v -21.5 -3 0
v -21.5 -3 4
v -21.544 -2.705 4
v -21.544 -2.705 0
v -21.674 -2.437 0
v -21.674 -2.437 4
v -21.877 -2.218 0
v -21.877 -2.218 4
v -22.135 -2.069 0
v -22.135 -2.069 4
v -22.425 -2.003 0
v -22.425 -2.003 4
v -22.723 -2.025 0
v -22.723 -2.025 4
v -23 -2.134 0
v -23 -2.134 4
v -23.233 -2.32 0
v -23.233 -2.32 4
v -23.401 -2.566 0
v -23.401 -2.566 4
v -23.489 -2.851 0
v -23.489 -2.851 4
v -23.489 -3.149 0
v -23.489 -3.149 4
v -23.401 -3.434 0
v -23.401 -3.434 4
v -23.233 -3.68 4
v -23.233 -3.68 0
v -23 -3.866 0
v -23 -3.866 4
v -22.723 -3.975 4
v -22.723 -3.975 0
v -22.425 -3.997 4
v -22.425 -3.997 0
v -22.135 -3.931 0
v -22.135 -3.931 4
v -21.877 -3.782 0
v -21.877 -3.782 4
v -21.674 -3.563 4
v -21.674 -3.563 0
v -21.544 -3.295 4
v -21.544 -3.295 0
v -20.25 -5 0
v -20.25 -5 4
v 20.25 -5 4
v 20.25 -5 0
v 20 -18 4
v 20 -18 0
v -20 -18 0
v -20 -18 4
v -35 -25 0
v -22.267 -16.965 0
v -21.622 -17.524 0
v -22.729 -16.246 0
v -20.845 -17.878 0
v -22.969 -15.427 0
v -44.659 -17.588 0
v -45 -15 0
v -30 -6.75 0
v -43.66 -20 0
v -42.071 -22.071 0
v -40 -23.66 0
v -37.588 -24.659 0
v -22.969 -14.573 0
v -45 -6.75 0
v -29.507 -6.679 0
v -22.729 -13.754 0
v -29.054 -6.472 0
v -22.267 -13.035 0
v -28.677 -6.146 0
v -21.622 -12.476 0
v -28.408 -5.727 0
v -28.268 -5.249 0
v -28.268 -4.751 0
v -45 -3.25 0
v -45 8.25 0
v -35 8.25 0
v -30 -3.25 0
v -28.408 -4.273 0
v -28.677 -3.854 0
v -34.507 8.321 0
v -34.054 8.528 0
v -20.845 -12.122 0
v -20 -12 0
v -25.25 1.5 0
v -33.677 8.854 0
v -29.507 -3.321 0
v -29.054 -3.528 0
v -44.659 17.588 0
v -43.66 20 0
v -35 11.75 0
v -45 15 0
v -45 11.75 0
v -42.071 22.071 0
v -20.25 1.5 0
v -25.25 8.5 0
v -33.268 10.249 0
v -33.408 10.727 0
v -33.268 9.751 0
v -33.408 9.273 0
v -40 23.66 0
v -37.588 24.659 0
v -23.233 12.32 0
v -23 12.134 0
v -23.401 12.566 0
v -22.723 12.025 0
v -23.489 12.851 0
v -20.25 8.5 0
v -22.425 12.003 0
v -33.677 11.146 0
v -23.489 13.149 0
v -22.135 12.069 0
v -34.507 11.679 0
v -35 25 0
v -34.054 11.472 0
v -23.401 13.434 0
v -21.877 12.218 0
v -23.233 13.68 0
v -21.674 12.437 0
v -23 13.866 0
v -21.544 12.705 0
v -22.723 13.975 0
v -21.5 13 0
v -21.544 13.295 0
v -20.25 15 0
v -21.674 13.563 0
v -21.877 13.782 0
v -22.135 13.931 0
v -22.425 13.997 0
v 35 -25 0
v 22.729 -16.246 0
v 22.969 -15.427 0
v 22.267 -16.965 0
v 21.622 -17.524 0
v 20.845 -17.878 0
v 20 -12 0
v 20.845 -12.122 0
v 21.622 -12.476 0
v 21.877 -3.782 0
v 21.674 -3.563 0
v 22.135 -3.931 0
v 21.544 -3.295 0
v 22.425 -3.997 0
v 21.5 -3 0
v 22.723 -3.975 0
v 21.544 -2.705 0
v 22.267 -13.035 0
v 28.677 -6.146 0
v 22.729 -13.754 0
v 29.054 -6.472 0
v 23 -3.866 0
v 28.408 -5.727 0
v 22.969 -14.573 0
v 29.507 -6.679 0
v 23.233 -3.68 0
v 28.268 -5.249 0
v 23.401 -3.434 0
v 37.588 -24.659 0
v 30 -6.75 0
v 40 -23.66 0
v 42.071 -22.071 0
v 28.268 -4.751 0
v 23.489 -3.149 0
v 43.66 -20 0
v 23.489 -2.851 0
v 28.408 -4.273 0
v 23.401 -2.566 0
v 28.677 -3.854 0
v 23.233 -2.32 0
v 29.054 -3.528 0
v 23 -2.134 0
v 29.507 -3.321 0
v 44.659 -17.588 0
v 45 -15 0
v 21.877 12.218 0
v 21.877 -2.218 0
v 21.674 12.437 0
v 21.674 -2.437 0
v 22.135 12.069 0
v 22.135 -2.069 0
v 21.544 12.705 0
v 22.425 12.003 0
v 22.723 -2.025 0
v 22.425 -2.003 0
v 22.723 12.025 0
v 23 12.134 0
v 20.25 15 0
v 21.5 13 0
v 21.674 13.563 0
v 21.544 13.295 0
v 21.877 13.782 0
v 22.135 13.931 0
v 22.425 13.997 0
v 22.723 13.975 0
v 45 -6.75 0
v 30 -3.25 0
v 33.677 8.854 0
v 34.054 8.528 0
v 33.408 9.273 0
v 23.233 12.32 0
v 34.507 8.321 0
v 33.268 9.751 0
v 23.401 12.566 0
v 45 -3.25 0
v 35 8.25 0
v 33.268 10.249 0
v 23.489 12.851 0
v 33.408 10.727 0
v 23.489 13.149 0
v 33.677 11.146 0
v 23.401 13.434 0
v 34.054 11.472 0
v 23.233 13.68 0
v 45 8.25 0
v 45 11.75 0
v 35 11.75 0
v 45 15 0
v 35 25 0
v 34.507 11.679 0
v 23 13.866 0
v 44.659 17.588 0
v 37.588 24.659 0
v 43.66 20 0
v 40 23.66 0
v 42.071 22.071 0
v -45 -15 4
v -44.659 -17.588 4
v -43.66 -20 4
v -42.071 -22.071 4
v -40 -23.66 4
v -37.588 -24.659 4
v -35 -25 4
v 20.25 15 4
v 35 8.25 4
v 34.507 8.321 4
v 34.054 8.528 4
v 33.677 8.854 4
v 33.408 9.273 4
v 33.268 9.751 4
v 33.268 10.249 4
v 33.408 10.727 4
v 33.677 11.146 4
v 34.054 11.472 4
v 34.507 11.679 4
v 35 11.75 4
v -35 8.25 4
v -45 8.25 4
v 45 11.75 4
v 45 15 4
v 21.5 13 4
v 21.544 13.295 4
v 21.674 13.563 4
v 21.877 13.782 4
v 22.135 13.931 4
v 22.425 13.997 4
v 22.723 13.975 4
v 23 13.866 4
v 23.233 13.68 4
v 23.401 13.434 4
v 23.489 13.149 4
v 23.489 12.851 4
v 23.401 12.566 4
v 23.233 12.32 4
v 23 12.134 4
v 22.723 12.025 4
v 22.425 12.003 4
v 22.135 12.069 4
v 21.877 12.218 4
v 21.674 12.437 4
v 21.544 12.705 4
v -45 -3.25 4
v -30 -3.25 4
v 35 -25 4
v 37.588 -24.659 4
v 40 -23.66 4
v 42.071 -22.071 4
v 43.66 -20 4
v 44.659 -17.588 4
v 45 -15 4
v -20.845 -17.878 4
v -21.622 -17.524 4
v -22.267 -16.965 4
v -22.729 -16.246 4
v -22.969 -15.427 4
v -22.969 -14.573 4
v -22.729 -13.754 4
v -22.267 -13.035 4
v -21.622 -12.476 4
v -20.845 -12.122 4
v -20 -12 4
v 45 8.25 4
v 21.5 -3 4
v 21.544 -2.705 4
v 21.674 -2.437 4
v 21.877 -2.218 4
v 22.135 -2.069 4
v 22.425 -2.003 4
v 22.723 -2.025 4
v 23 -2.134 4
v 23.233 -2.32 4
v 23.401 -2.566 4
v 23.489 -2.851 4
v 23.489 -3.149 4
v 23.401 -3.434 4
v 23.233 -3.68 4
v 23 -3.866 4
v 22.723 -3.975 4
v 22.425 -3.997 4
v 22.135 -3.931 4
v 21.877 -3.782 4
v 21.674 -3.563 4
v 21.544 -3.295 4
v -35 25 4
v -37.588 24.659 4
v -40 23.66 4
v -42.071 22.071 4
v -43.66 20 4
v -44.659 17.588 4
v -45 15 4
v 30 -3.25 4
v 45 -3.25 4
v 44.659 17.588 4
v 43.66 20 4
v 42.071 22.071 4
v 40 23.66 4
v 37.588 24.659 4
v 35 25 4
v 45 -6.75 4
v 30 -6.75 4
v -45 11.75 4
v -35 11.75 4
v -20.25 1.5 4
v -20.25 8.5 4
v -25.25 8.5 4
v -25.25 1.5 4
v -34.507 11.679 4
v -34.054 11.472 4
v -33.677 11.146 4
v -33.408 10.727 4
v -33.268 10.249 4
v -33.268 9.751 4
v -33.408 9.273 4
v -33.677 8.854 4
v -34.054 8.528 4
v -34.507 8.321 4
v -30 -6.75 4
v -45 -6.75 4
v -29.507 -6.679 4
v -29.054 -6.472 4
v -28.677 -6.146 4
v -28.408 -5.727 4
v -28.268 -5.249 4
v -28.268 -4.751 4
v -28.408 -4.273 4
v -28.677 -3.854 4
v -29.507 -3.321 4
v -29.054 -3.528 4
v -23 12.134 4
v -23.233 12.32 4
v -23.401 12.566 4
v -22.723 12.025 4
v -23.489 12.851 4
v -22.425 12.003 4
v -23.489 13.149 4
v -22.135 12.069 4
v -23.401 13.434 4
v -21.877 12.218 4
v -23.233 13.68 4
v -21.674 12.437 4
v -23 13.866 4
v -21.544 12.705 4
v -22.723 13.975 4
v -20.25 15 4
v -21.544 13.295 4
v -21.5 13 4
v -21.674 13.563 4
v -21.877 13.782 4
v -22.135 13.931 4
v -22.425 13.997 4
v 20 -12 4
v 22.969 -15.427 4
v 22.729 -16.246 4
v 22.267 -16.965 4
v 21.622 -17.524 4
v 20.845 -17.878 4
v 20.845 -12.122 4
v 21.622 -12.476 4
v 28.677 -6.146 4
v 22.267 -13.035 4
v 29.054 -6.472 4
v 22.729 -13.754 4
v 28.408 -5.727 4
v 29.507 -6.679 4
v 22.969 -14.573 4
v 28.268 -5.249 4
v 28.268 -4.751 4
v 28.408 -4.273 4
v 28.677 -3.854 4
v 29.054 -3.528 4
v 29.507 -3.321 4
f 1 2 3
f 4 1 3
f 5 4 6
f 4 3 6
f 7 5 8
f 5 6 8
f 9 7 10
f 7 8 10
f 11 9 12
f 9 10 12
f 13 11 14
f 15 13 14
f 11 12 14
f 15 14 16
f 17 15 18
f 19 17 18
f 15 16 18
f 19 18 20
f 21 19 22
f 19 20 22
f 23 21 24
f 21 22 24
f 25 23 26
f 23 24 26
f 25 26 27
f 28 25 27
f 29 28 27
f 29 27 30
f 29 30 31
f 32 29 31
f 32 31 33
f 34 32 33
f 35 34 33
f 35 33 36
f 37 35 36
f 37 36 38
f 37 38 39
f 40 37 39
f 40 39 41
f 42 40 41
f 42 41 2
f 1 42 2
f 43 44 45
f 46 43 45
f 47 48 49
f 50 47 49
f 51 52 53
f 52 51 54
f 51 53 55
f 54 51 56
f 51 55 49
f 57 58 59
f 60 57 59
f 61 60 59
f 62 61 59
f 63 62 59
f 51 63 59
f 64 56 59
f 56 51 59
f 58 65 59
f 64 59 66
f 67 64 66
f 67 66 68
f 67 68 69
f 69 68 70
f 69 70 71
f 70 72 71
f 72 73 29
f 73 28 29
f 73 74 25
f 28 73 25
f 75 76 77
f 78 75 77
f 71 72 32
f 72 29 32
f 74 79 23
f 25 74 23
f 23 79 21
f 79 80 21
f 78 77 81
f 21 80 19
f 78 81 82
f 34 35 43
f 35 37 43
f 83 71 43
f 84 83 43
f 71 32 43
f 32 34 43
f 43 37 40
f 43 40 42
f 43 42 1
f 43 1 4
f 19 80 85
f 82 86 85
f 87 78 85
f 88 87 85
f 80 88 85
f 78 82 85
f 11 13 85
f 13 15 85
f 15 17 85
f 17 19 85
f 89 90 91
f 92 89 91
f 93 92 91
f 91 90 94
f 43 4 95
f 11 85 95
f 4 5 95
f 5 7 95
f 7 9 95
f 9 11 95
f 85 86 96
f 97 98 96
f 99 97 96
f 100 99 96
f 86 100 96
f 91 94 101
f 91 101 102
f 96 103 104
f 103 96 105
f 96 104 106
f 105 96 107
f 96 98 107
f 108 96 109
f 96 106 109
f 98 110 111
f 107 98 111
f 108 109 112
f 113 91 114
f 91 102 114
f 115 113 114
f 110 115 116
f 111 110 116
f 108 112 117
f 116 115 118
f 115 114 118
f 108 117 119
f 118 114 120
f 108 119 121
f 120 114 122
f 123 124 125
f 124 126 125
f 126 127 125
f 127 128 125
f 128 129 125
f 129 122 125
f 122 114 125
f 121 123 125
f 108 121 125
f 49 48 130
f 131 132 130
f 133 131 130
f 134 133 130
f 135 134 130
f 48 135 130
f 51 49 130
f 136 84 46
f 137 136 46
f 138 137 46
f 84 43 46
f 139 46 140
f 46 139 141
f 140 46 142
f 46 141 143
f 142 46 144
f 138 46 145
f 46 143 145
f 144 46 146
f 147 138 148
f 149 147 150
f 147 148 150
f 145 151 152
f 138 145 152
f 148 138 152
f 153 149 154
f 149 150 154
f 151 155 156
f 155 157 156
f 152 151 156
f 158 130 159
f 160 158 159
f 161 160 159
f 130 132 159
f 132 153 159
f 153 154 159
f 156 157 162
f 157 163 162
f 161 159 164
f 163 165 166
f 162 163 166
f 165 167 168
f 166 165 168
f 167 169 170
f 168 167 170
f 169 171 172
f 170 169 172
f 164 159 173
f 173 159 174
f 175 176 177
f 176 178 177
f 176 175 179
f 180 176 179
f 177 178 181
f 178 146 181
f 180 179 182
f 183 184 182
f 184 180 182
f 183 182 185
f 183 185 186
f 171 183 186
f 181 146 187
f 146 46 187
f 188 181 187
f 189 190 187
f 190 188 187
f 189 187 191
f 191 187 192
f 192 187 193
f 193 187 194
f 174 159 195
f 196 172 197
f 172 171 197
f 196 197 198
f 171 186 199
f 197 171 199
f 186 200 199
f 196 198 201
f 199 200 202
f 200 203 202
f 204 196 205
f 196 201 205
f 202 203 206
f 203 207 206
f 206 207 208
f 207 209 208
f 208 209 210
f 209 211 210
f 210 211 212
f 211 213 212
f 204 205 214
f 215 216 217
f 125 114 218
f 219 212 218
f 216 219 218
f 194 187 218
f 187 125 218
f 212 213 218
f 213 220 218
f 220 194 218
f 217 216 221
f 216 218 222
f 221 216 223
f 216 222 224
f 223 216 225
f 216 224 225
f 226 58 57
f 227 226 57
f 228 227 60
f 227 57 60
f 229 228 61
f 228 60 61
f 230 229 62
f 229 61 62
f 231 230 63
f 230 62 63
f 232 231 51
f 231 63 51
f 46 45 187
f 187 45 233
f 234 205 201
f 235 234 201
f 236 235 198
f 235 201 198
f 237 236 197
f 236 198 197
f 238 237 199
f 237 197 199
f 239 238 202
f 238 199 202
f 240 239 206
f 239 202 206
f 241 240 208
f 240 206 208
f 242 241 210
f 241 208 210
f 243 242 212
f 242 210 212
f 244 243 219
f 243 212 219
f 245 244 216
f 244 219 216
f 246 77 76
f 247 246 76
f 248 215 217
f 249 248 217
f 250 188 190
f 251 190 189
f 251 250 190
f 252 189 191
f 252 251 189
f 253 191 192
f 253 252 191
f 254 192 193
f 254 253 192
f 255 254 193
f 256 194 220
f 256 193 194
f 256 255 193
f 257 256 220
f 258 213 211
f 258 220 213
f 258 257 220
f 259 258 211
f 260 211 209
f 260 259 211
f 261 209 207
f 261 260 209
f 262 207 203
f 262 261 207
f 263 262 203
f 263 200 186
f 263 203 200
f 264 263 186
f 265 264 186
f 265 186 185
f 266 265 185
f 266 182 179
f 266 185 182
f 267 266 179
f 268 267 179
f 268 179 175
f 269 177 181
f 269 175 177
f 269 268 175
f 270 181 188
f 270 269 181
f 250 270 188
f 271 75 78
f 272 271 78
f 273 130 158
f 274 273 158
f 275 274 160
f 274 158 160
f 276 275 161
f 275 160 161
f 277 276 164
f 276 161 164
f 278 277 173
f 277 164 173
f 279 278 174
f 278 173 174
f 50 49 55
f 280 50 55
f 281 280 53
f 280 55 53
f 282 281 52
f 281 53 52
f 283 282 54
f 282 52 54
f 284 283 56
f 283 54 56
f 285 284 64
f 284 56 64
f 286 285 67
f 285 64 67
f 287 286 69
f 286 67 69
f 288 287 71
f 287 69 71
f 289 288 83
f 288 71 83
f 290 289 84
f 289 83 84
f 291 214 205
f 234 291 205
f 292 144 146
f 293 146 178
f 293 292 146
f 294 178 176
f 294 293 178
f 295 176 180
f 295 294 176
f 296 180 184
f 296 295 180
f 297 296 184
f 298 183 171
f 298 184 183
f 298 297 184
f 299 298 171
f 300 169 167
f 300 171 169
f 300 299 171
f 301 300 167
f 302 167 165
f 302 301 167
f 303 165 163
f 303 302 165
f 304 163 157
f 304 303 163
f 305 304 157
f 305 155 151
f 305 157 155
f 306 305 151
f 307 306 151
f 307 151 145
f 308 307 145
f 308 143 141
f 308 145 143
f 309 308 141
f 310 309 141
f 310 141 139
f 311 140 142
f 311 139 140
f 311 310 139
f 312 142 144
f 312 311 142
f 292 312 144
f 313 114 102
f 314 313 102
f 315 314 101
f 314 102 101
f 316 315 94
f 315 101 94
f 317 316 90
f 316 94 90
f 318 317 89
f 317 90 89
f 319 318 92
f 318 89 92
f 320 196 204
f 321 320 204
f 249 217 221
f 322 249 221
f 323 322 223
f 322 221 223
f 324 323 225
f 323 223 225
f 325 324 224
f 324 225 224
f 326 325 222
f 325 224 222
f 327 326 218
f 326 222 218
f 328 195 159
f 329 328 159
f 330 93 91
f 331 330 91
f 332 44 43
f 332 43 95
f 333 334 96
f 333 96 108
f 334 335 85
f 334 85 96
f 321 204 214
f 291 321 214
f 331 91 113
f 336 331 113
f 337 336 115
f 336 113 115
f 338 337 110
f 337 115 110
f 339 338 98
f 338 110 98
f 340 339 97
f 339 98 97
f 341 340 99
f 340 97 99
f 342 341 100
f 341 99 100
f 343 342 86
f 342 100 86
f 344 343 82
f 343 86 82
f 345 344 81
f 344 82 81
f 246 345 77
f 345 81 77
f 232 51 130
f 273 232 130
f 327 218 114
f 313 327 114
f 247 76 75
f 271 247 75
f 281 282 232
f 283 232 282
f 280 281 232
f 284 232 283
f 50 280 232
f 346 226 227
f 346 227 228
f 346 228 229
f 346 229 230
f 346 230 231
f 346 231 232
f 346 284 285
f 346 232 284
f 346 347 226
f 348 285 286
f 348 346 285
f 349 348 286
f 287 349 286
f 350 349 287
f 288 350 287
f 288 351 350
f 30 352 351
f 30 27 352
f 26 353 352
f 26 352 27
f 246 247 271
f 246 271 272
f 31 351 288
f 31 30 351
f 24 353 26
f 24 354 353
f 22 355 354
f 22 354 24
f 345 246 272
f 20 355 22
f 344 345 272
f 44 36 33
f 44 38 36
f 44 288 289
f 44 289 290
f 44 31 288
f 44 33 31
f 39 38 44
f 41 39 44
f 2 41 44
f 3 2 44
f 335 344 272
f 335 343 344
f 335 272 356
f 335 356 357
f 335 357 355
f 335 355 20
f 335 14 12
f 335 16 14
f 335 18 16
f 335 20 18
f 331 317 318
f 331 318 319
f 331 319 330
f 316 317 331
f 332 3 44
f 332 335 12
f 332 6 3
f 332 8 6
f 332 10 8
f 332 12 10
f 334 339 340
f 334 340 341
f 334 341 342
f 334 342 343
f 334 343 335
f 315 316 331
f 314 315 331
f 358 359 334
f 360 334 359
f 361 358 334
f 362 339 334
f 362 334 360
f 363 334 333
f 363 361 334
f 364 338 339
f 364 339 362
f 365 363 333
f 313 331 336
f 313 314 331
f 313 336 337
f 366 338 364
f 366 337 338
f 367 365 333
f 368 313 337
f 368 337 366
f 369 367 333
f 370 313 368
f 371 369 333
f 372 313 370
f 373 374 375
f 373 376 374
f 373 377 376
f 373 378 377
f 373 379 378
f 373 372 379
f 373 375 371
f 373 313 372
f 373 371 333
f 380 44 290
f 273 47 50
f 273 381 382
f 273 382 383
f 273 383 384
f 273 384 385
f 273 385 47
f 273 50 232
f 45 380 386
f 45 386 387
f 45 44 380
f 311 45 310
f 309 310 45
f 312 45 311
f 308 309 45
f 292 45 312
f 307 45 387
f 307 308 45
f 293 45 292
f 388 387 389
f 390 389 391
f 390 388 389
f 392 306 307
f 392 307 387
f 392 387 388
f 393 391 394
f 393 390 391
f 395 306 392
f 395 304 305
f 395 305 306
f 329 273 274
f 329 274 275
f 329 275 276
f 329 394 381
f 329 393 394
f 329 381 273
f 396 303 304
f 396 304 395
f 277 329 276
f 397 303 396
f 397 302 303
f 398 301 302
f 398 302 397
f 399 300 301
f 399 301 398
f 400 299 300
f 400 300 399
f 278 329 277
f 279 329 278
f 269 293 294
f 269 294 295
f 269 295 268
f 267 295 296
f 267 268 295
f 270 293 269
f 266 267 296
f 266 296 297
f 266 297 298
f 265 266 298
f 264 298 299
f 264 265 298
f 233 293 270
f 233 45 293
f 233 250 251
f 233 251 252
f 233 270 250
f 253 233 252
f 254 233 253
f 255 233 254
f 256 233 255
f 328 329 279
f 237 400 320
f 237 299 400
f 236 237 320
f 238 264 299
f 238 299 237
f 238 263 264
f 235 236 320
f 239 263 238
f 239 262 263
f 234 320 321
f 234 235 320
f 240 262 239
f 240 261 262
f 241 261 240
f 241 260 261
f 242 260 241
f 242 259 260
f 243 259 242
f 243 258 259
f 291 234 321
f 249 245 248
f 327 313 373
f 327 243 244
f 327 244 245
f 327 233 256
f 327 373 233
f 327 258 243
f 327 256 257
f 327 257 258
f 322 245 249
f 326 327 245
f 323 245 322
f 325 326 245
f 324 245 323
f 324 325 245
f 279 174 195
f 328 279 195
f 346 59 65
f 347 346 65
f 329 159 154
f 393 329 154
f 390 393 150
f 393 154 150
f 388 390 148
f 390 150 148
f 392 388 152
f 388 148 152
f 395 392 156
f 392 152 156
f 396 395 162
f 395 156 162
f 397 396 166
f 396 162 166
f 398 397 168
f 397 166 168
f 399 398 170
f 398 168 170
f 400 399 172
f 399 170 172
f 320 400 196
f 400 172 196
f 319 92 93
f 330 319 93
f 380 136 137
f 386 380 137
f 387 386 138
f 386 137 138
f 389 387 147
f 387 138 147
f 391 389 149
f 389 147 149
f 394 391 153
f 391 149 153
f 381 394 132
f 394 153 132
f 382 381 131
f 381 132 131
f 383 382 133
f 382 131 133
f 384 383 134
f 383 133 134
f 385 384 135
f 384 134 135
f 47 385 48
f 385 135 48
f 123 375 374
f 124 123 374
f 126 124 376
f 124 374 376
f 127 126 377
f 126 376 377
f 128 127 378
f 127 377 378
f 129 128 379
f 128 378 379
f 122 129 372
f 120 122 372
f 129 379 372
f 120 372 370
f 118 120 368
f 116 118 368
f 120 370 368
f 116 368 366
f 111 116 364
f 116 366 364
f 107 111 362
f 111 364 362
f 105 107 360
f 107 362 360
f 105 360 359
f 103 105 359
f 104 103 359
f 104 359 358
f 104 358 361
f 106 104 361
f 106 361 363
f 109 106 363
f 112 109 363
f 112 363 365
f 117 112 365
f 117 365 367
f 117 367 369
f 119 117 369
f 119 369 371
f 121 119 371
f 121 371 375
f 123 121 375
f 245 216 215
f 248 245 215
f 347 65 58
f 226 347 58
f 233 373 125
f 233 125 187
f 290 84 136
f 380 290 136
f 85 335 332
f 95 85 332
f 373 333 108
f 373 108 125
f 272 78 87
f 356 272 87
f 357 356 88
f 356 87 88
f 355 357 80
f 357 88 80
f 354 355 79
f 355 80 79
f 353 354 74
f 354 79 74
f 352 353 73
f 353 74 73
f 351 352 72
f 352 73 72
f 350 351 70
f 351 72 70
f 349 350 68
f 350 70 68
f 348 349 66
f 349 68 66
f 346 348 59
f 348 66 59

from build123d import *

# Parameters (mm, degrees)
SKETCH_1_R          = 3
SKETCH_1_W          = 40
SKETCH_1_H          = 20
EXTRUDE_1_DEPTH     = 4
EXTRUDE_3_DEPTH     = 4
SKETCH_3_R          = 3
EXTRUDE_4_DEPTH     = 4
SKETCH_4_R          = 1
CUT_EXTRUDE_1_DEPTH = 4
SKETCH_5_R          = 1
CUT_EXTRUDE_2_DEPTH = 5
SKETCH_6_W          = 5
SKETCH_6_H          = 7
SKETCH_6_W_2        = 40.5
SKETCH_6_H_2        = 20
SKETCH_6_R          = 1
SKETCH_6_W_3        = 22
SKETCH_6_H_3        = 12
CUT_EXTRUDE_3_DEPTH = 10


with BuildPart() as part:
    # 草图1 → 凸台-拉伸1 (new body)
    with BuildSketch(Plane.XY):
        with BuildLine():
            ThreePointArc((-45, -15), (-42.071067812, -22.071067812), (-35, -25))
            Line((-35, -25), (35, -25))
            ThreePointArc((35, -25), (42.071067812, -22.071067812), (45, -15))
            Line((45, -15), (45, -6.75))
            Line((45, -6.75), (30, -6.75))
            ThreePointArc((30, -6.75), (28.25, -5), (30, -3.25))
            Line((30, -3.25), (45, -3.25))
            Line((45, -3.25), (45, 8.25))
            Line((45, 8.25), (35, 8.25))
            ThreePointArc((35, 8.25), (33.25, 10), (35, 11.75))
            Line((35, 11.75), (45, 11.75))
            Line((45, 11.75), (45, 15))
            ThreePointArc((45, 15), (42.071067812, 22.071067812), (35, 25))
            Line((35, 25), (-35, 25))
            ThreePointArc((-35, 25), (-42.071067812, 22.071067812), (-45, 15))
            Line((-45, 15), (-45, 11.75))
            Line((-45, 11.75), (-35, 11.75))
            ThreePointArc((-35, 11.75), (-33.25, 10), (-35, 8.25))
            Line((-35, 8.25), (-45, 8.25))
            Line((-45, 8.25), (-45, -3.25))
            Line((-45, -3.25), (-30, -3.25))
            ThreePointArc((-30, -3.25), (-28.25, -5), (-30, -6.75))
            Line((-30, -6.75), (-45, -6.75))
            Line((-45, -6.75), (-45, -15))
        make_face()
        with BuildLine():
            ThreePointArc((-20, -18), (-23, -15), (-20, -12))
            Line((-20, -12), (20, -12))
            ThreePointArc((20, -12), (23, -15), (20, -18))
            Line((20, -18), (-20, -18))
        make_face(mode=Mode.SUBTRACT)
        with Locations((-24, 0)):
            Circle(SKETCH_1_R, mode=Mode.SUBTRACT)
        with Locations((-24, 10)):
            Circle(SKETCH_1_R, mode=Mode.SUBTRACT)
        with Locations((0, 5)):
            Rectangle(SKETCH_1_W, SKETCH_1_H, mode=Mode.SUBTRACT)
        with Locations((24, 0)):
            Circle(SKETCH_1_R, mode=Mode.SUBTRACT)
        with Locations((24, 10)):
            Circle(SKETCH_1_R, mode=Mode.SUBTRACT)
    extrude(amount=EXTRUDE_1_DEPTH)

    # 草图2 → 凸台-拉伸3 (add)
    with BuildSketch(Plane.XY.offset(4)):
        Polygon((20, -5), (20, 5), (11, 5), (11, -1), (-11, -1), (-11, 5), (-20, 5), (-20, -5), align=None)
        Polygon((11, 5), (20, 5), (20, 15), (-20, 15), (-20, 5), (-11, 5), (-11, 11), (11, 11), align=None)
    extrude(amount=-EXTRUDE_3_DEPTH)

    # 草图3 → 凸台-拉伸4 (add)
    with BuildSketch(Plane.XY.offset(4)):
        with Locations((-24, 10)):
            Circle(SKETCH_3_R)
        with Locations((-24, 0)):
            Circle(SKETCH_3_R)
        with Locations((24, 10)):
            Circle(SKETCH_3_R)
        with Locations((24, 0)):
            Circle(SKETCH_3_R)
    extrude(amount=-EXTRUDE_4_DEPTH)

    # 草图4 → 切除-拉伸1 (cut)
    with BuildSketch(Plane.XY.offset(4)):
        with Locations((-14, 5)):
            Circle(SKETCH_4_R)
        with Locations((14, 5)):
            Circle(SKETCH_4_R)
    extrude(amount=-CUT_EXTRUDE_1_DEPTH, mode=Mode.SUBTRACT)

    # 草图5 → 切除-拉伸2 (cut, through all)
    with BuildSketch(Plane.XY.offset(4)):
        with Locations((-22.5, -3)):
            Circle(SKETCH_5_R)
        with Locations((-22.5, 13)):
            Circle(SKETCH_5_R)
    cut_extrude_2 = extrude(amount=-CUT_EXTRUDE_2_DEPTH, mode=Mode.SUBTRACT)

    # 镜向1: 切除-拉伸2 across plane
    add(cut_extrude_2.mirror(Plane(origin=(0, 0, 0), x_dir=(0, 0, 1), z_dir=(1, 0, 0))), mode=Mode.SUBTRACT)

    # 草图6 → 切除-拉伸3 (cut)
    with BuildSketch(Plane.XY.offset(4)):
        with Locations((-22.75, 5)):
            Rectangle(SKETCH_6_W, SKETCH_6_H)
        with Locations((0, 5)):
            Rectangle(SKETCH_6_W_2, SKETCH_6_H_2)
        with Locations((14, 5)):
            Circle(SKETCH_6_R, mode=Mode.SUBTRACT)
        with Locations((-14, 5)):
            Circle(SKETCH_6_R, mode=Mode.SUBTRACT)
        with Locations((0, 5)):
            Rectangle(SKETCH_6_W_3, SKETCH_6_H_3, mode=Mode.SUBTRACT)
    extrude(amount=-CUT_EXTRUDE_3_DEPTH, mode=Mode.SUBTRACT)


solid = part.part
